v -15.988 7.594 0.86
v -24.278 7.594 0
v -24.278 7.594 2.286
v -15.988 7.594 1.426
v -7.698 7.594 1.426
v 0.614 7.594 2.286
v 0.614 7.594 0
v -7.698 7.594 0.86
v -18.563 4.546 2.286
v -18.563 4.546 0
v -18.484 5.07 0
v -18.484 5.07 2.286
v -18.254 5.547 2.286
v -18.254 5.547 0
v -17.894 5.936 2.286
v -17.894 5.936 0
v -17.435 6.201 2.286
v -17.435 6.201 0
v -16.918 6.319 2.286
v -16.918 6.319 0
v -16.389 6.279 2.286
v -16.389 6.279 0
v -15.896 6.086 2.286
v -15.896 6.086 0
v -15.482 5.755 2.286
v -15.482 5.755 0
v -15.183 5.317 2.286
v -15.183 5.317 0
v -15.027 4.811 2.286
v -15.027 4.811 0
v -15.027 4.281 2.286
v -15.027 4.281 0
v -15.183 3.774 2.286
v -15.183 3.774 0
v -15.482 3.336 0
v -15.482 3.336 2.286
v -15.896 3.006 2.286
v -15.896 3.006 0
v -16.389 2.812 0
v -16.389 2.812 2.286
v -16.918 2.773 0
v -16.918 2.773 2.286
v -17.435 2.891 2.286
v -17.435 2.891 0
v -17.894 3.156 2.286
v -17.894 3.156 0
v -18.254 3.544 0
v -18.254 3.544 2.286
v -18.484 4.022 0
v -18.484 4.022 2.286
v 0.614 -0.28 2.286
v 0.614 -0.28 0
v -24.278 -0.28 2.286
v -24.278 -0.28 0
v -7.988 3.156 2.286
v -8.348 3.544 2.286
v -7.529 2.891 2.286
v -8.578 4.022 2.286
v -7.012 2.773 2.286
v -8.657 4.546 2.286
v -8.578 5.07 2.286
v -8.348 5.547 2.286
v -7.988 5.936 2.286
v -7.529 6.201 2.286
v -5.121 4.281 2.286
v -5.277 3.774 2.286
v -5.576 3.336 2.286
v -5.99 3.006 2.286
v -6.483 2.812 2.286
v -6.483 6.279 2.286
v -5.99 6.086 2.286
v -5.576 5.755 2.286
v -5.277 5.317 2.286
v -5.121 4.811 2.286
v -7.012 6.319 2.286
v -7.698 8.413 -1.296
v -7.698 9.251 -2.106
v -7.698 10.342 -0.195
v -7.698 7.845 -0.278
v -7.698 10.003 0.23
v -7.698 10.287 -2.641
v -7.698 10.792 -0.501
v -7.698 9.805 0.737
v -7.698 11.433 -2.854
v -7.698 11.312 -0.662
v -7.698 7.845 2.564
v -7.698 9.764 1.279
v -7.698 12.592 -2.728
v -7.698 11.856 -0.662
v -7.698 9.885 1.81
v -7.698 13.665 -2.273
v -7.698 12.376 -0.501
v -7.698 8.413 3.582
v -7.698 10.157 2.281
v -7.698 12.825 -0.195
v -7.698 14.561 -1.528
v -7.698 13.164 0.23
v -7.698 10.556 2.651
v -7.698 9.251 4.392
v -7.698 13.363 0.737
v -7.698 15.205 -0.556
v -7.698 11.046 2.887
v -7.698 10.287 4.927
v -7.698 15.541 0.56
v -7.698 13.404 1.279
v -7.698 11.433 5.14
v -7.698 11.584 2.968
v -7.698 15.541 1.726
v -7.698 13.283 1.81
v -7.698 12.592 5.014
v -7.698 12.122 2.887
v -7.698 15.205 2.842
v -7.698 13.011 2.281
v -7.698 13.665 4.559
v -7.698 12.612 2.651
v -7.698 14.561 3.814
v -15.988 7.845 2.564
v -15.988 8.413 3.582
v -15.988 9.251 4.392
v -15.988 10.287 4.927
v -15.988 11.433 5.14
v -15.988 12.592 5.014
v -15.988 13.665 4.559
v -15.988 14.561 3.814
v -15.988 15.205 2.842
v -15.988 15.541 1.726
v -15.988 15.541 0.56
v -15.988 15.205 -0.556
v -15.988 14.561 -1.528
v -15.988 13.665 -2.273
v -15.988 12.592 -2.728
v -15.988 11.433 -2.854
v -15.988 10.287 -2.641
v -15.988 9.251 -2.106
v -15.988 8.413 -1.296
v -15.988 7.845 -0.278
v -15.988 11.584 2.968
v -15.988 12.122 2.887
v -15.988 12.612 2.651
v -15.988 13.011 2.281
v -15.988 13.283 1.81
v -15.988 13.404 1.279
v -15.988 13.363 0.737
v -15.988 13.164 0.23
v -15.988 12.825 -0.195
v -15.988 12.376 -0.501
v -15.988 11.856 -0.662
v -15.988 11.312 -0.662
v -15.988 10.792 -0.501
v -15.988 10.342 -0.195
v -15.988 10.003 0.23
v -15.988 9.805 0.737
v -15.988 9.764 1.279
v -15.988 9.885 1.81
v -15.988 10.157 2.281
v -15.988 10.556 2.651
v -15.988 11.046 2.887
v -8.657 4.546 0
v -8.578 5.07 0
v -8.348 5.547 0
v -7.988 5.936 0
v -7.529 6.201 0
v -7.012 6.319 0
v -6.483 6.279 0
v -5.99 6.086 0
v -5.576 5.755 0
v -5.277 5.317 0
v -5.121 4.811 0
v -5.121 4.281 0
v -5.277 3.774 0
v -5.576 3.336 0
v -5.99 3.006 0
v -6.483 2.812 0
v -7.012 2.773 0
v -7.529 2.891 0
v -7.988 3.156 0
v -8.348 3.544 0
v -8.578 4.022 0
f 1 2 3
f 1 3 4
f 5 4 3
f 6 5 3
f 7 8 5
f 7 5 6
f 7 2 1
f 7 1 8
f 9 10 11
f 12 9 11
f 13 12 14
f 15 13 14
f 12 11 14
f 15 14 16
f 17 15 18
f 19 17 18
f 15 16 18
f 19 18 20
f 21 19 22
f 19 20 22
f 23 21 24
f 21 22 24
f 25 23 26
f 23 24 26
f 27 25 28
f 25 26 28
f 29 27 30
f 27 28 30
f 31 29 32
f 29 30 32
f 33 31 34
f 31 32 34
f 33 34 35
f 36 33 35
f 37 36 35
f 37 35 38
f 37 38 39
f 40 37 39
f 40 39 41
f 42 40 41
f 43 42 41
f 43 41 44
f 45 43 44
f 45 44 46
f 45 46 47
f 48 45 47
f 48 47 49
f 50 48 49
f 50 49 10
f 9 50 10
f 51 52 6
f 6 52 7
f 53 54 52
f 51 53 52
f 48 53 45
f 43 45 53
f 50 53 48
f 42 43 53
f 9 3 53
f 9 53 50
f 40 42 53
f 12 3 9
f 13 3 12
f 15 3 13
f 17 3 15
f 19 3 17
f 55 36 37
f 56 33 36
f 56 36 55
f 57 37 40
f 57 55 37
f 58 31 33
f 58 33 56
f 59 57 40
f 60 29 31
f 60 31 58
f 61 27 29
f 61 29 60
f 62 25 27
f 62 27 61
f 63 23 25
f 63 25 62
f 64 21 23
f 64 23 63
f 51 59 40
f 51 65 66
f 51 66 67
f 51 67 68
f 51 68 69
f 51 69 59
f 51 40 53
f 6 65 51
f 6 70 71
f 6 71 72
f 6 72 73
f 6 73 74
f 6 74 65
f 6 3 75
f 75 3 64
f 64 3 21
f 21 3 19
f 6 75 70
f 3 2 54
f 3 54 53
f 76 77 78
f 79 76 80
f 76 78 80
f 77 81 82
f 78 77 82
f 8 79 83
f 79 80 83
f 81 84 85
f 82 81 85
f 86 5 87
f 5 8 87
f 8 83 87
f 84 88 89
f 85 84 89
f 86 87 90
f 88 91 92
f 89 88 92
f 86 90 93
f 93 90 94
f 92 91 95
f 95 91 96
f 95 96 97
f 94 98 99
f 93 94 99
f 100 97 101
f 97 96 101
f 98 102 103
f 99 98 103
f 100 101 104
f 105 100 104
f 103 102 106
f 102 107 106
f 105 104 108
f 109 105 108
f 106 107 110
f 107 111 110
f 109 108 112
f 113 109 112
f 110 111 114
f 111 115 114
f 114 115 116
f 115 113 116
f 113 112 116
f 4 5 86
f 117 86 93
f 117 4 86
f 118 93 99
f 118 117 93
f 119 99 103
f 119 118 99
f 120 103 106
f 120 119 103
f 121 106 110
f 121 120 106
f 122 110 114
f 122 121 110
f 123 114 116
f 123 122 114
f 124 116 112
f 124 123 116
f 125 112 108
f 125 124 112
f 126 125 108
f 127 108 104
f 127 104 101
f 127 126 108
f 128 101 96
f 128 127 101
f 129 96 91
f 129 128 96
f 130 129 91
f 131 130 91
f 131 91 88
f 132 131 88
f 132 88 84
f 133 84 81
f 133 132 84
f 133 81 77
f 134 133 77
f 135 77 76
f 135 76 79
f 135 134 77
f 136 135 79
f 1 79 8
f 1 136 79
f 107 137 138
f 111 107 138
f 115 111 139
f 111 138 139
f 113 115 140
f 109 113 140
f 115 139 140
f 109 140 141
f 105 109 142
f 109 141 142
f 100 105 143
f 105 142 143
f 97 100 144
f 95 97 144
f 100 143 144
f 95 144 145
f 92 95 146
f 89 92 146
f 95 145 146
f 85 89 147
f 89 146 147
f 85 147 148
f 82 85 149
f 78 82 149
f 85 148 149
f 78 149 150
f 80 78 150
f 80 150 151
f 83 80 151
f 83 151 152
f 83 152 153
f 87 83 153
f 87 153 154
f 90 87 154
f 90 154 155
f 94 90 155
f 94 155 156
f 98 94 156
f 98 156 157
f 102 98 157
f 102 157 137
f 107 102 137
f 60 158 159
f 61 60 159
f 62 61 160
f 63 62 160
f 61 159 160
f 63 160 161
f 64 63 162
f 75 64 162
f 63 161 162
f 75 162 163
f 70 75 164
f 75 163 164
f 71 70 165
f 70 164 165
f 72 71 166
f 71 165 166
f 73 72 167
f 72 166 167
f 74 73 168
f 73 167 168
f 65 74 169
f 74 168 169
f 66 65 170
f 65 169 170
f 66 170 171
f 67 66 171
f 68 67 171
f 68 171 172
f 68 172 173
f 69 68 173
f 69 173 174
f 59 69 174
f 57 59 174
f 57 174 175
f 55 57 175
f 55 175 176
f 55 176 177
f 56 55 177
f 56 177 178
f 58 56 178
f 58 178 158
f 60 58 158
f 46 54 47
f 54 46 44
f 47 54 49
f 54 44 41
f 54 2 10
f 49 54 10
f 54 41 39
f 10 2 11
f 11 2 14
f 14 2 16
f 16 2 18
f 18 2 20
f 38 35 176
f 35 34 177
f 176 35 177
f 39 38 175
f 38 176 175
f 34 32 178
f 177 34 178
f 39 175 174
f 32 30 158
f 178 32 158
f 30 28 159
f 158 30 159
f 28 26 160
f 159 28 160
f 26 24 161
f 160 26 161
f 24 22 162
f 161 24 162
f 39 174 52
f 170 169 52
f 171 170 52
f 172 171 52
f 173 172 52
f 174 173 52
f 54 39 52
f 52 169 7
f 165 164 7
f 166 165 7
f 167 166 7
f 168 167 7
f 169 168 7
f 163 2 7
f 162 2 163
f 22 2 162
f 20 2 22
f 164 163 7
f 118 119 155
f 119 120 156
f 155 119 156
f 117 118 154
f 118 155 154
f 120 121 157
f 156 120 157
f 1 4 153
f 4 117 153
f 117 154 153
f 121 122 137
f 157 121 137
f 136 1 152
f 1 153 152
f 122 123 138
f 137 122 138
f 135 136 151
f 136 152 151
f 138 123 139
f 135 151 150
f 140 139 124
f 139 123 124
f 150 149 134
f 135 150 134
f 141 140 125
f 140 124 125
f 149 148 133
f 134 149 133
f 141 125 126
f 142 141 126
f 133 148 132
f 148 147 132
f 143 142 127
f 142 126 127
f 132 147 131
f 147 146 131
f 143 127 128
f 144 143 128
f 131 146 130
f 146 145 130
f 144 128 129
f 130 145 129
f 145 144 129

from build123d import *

# Parameters (mm, degrees)
SKETCH1_W           = 24.892
SKETCH1_H           = 7.874
BOSS_EXTRUDE1_DEPTH = 2.286
SKETCH4_R           = 4
BOSS_EXTRUDE3_DEPTH = 16.58
SKETCH5_R           = 1.825
CUT_EXTRUDE2_DEPTH  = 16.58
CUT_EXTRUDE3_DEPTH  = 8.29
SKETCH8_R           = 1.778
CUT_EXTRUDE4_DEPTH  = 8.29
SKETCH9_W           = 2.190957137
SKETCH9_H           = 1.309901185
SKETCH9_W_2         = 1.781735984
SKETCH9_H_2         = 0.803323297
CUT_EXTRUDE5_DEPTH  = 8.29


with BuildPart() as part:
    # Sketch1 → Boss-Extrude1 (new body)
    with BuildSketch(Plane.XY):
        with Locations((-11.83196875, 3.65678125)):
            Rectangle(SKETCH1_W, SKETCH1_H)
    extrude(amount=BOSS_EXTRUDE1_DEPTH)

    # Sketch4 → Boss-Extrude3 (add)
    with BuildSketch(Plane.ZY.offset(24.27796875)):
        with Locations((1.143, 11.58378125)):
            Circle(SKETCH4_R)
    extrude(amount=-BOSS_EXTRUDE3_DEPTH)

    # Sketch5 → Cut-Extrude2 (cut)
    with BuildSketch(Plane.ZY.offset(24.27796875)):
        with Locations((1.143, 11.58378125)):
            Circle(SKETCH5_R)
    extrude(amount=-CUT_EXTRUDE2_DEPTH, mode=Mode.SUBTRACT)

    # Sketch7 → Cut-Extrude3 (cut)
    with BuildSketch(Plane.ZY.offset(24.27796875)):
        Polygon((0.43016706, 7.59378125), (-5.580589686, 7.59378125), (-5.580589686, 19.623956734), (9.570834238, 19.623956734), (9.570834238, 7.59378125), align=None)
    extrude(amount=-CUT_EXTRUDE3_DEPTH, mode=Mode.SUBTRACT)

    # Sketch8 → Cut-Extrude4 (cut)
    with BuildSketch(Plane(origin=(0, 0, 0), x_dir=(-1, 0, 0), z_dir=(0, 0, -1))):
        with Locations((6.87896875, 4.54578125)):
            Circle(SKETCH8_R)
        with Locations((16.78496875, 4.54578125)):
            Circle(SKETCH8_R)
    extrude(amount=-CUT_EXTRUDE4_DEPTH, mode=Mode.SUBTRACT)

    # Sketch9 → Cut-Extrude5 (cut)
    with BuildSketch(Plane.ZY.offset(24.27796875)):
        with Locations((3.381478569, 7.915515048)):
            Rectangle(SKETCH9_W, SKETCH9_H)
        with Locations((-0.890867992, 7.662226104)):
            Rectangle(SKETCH9_W_2, SKETCH9_H_2)
    extrude(amount=-CUT_EXTRUDE5_DEPTH, mode=Mode.SUBTRACT)


solid = part.part
